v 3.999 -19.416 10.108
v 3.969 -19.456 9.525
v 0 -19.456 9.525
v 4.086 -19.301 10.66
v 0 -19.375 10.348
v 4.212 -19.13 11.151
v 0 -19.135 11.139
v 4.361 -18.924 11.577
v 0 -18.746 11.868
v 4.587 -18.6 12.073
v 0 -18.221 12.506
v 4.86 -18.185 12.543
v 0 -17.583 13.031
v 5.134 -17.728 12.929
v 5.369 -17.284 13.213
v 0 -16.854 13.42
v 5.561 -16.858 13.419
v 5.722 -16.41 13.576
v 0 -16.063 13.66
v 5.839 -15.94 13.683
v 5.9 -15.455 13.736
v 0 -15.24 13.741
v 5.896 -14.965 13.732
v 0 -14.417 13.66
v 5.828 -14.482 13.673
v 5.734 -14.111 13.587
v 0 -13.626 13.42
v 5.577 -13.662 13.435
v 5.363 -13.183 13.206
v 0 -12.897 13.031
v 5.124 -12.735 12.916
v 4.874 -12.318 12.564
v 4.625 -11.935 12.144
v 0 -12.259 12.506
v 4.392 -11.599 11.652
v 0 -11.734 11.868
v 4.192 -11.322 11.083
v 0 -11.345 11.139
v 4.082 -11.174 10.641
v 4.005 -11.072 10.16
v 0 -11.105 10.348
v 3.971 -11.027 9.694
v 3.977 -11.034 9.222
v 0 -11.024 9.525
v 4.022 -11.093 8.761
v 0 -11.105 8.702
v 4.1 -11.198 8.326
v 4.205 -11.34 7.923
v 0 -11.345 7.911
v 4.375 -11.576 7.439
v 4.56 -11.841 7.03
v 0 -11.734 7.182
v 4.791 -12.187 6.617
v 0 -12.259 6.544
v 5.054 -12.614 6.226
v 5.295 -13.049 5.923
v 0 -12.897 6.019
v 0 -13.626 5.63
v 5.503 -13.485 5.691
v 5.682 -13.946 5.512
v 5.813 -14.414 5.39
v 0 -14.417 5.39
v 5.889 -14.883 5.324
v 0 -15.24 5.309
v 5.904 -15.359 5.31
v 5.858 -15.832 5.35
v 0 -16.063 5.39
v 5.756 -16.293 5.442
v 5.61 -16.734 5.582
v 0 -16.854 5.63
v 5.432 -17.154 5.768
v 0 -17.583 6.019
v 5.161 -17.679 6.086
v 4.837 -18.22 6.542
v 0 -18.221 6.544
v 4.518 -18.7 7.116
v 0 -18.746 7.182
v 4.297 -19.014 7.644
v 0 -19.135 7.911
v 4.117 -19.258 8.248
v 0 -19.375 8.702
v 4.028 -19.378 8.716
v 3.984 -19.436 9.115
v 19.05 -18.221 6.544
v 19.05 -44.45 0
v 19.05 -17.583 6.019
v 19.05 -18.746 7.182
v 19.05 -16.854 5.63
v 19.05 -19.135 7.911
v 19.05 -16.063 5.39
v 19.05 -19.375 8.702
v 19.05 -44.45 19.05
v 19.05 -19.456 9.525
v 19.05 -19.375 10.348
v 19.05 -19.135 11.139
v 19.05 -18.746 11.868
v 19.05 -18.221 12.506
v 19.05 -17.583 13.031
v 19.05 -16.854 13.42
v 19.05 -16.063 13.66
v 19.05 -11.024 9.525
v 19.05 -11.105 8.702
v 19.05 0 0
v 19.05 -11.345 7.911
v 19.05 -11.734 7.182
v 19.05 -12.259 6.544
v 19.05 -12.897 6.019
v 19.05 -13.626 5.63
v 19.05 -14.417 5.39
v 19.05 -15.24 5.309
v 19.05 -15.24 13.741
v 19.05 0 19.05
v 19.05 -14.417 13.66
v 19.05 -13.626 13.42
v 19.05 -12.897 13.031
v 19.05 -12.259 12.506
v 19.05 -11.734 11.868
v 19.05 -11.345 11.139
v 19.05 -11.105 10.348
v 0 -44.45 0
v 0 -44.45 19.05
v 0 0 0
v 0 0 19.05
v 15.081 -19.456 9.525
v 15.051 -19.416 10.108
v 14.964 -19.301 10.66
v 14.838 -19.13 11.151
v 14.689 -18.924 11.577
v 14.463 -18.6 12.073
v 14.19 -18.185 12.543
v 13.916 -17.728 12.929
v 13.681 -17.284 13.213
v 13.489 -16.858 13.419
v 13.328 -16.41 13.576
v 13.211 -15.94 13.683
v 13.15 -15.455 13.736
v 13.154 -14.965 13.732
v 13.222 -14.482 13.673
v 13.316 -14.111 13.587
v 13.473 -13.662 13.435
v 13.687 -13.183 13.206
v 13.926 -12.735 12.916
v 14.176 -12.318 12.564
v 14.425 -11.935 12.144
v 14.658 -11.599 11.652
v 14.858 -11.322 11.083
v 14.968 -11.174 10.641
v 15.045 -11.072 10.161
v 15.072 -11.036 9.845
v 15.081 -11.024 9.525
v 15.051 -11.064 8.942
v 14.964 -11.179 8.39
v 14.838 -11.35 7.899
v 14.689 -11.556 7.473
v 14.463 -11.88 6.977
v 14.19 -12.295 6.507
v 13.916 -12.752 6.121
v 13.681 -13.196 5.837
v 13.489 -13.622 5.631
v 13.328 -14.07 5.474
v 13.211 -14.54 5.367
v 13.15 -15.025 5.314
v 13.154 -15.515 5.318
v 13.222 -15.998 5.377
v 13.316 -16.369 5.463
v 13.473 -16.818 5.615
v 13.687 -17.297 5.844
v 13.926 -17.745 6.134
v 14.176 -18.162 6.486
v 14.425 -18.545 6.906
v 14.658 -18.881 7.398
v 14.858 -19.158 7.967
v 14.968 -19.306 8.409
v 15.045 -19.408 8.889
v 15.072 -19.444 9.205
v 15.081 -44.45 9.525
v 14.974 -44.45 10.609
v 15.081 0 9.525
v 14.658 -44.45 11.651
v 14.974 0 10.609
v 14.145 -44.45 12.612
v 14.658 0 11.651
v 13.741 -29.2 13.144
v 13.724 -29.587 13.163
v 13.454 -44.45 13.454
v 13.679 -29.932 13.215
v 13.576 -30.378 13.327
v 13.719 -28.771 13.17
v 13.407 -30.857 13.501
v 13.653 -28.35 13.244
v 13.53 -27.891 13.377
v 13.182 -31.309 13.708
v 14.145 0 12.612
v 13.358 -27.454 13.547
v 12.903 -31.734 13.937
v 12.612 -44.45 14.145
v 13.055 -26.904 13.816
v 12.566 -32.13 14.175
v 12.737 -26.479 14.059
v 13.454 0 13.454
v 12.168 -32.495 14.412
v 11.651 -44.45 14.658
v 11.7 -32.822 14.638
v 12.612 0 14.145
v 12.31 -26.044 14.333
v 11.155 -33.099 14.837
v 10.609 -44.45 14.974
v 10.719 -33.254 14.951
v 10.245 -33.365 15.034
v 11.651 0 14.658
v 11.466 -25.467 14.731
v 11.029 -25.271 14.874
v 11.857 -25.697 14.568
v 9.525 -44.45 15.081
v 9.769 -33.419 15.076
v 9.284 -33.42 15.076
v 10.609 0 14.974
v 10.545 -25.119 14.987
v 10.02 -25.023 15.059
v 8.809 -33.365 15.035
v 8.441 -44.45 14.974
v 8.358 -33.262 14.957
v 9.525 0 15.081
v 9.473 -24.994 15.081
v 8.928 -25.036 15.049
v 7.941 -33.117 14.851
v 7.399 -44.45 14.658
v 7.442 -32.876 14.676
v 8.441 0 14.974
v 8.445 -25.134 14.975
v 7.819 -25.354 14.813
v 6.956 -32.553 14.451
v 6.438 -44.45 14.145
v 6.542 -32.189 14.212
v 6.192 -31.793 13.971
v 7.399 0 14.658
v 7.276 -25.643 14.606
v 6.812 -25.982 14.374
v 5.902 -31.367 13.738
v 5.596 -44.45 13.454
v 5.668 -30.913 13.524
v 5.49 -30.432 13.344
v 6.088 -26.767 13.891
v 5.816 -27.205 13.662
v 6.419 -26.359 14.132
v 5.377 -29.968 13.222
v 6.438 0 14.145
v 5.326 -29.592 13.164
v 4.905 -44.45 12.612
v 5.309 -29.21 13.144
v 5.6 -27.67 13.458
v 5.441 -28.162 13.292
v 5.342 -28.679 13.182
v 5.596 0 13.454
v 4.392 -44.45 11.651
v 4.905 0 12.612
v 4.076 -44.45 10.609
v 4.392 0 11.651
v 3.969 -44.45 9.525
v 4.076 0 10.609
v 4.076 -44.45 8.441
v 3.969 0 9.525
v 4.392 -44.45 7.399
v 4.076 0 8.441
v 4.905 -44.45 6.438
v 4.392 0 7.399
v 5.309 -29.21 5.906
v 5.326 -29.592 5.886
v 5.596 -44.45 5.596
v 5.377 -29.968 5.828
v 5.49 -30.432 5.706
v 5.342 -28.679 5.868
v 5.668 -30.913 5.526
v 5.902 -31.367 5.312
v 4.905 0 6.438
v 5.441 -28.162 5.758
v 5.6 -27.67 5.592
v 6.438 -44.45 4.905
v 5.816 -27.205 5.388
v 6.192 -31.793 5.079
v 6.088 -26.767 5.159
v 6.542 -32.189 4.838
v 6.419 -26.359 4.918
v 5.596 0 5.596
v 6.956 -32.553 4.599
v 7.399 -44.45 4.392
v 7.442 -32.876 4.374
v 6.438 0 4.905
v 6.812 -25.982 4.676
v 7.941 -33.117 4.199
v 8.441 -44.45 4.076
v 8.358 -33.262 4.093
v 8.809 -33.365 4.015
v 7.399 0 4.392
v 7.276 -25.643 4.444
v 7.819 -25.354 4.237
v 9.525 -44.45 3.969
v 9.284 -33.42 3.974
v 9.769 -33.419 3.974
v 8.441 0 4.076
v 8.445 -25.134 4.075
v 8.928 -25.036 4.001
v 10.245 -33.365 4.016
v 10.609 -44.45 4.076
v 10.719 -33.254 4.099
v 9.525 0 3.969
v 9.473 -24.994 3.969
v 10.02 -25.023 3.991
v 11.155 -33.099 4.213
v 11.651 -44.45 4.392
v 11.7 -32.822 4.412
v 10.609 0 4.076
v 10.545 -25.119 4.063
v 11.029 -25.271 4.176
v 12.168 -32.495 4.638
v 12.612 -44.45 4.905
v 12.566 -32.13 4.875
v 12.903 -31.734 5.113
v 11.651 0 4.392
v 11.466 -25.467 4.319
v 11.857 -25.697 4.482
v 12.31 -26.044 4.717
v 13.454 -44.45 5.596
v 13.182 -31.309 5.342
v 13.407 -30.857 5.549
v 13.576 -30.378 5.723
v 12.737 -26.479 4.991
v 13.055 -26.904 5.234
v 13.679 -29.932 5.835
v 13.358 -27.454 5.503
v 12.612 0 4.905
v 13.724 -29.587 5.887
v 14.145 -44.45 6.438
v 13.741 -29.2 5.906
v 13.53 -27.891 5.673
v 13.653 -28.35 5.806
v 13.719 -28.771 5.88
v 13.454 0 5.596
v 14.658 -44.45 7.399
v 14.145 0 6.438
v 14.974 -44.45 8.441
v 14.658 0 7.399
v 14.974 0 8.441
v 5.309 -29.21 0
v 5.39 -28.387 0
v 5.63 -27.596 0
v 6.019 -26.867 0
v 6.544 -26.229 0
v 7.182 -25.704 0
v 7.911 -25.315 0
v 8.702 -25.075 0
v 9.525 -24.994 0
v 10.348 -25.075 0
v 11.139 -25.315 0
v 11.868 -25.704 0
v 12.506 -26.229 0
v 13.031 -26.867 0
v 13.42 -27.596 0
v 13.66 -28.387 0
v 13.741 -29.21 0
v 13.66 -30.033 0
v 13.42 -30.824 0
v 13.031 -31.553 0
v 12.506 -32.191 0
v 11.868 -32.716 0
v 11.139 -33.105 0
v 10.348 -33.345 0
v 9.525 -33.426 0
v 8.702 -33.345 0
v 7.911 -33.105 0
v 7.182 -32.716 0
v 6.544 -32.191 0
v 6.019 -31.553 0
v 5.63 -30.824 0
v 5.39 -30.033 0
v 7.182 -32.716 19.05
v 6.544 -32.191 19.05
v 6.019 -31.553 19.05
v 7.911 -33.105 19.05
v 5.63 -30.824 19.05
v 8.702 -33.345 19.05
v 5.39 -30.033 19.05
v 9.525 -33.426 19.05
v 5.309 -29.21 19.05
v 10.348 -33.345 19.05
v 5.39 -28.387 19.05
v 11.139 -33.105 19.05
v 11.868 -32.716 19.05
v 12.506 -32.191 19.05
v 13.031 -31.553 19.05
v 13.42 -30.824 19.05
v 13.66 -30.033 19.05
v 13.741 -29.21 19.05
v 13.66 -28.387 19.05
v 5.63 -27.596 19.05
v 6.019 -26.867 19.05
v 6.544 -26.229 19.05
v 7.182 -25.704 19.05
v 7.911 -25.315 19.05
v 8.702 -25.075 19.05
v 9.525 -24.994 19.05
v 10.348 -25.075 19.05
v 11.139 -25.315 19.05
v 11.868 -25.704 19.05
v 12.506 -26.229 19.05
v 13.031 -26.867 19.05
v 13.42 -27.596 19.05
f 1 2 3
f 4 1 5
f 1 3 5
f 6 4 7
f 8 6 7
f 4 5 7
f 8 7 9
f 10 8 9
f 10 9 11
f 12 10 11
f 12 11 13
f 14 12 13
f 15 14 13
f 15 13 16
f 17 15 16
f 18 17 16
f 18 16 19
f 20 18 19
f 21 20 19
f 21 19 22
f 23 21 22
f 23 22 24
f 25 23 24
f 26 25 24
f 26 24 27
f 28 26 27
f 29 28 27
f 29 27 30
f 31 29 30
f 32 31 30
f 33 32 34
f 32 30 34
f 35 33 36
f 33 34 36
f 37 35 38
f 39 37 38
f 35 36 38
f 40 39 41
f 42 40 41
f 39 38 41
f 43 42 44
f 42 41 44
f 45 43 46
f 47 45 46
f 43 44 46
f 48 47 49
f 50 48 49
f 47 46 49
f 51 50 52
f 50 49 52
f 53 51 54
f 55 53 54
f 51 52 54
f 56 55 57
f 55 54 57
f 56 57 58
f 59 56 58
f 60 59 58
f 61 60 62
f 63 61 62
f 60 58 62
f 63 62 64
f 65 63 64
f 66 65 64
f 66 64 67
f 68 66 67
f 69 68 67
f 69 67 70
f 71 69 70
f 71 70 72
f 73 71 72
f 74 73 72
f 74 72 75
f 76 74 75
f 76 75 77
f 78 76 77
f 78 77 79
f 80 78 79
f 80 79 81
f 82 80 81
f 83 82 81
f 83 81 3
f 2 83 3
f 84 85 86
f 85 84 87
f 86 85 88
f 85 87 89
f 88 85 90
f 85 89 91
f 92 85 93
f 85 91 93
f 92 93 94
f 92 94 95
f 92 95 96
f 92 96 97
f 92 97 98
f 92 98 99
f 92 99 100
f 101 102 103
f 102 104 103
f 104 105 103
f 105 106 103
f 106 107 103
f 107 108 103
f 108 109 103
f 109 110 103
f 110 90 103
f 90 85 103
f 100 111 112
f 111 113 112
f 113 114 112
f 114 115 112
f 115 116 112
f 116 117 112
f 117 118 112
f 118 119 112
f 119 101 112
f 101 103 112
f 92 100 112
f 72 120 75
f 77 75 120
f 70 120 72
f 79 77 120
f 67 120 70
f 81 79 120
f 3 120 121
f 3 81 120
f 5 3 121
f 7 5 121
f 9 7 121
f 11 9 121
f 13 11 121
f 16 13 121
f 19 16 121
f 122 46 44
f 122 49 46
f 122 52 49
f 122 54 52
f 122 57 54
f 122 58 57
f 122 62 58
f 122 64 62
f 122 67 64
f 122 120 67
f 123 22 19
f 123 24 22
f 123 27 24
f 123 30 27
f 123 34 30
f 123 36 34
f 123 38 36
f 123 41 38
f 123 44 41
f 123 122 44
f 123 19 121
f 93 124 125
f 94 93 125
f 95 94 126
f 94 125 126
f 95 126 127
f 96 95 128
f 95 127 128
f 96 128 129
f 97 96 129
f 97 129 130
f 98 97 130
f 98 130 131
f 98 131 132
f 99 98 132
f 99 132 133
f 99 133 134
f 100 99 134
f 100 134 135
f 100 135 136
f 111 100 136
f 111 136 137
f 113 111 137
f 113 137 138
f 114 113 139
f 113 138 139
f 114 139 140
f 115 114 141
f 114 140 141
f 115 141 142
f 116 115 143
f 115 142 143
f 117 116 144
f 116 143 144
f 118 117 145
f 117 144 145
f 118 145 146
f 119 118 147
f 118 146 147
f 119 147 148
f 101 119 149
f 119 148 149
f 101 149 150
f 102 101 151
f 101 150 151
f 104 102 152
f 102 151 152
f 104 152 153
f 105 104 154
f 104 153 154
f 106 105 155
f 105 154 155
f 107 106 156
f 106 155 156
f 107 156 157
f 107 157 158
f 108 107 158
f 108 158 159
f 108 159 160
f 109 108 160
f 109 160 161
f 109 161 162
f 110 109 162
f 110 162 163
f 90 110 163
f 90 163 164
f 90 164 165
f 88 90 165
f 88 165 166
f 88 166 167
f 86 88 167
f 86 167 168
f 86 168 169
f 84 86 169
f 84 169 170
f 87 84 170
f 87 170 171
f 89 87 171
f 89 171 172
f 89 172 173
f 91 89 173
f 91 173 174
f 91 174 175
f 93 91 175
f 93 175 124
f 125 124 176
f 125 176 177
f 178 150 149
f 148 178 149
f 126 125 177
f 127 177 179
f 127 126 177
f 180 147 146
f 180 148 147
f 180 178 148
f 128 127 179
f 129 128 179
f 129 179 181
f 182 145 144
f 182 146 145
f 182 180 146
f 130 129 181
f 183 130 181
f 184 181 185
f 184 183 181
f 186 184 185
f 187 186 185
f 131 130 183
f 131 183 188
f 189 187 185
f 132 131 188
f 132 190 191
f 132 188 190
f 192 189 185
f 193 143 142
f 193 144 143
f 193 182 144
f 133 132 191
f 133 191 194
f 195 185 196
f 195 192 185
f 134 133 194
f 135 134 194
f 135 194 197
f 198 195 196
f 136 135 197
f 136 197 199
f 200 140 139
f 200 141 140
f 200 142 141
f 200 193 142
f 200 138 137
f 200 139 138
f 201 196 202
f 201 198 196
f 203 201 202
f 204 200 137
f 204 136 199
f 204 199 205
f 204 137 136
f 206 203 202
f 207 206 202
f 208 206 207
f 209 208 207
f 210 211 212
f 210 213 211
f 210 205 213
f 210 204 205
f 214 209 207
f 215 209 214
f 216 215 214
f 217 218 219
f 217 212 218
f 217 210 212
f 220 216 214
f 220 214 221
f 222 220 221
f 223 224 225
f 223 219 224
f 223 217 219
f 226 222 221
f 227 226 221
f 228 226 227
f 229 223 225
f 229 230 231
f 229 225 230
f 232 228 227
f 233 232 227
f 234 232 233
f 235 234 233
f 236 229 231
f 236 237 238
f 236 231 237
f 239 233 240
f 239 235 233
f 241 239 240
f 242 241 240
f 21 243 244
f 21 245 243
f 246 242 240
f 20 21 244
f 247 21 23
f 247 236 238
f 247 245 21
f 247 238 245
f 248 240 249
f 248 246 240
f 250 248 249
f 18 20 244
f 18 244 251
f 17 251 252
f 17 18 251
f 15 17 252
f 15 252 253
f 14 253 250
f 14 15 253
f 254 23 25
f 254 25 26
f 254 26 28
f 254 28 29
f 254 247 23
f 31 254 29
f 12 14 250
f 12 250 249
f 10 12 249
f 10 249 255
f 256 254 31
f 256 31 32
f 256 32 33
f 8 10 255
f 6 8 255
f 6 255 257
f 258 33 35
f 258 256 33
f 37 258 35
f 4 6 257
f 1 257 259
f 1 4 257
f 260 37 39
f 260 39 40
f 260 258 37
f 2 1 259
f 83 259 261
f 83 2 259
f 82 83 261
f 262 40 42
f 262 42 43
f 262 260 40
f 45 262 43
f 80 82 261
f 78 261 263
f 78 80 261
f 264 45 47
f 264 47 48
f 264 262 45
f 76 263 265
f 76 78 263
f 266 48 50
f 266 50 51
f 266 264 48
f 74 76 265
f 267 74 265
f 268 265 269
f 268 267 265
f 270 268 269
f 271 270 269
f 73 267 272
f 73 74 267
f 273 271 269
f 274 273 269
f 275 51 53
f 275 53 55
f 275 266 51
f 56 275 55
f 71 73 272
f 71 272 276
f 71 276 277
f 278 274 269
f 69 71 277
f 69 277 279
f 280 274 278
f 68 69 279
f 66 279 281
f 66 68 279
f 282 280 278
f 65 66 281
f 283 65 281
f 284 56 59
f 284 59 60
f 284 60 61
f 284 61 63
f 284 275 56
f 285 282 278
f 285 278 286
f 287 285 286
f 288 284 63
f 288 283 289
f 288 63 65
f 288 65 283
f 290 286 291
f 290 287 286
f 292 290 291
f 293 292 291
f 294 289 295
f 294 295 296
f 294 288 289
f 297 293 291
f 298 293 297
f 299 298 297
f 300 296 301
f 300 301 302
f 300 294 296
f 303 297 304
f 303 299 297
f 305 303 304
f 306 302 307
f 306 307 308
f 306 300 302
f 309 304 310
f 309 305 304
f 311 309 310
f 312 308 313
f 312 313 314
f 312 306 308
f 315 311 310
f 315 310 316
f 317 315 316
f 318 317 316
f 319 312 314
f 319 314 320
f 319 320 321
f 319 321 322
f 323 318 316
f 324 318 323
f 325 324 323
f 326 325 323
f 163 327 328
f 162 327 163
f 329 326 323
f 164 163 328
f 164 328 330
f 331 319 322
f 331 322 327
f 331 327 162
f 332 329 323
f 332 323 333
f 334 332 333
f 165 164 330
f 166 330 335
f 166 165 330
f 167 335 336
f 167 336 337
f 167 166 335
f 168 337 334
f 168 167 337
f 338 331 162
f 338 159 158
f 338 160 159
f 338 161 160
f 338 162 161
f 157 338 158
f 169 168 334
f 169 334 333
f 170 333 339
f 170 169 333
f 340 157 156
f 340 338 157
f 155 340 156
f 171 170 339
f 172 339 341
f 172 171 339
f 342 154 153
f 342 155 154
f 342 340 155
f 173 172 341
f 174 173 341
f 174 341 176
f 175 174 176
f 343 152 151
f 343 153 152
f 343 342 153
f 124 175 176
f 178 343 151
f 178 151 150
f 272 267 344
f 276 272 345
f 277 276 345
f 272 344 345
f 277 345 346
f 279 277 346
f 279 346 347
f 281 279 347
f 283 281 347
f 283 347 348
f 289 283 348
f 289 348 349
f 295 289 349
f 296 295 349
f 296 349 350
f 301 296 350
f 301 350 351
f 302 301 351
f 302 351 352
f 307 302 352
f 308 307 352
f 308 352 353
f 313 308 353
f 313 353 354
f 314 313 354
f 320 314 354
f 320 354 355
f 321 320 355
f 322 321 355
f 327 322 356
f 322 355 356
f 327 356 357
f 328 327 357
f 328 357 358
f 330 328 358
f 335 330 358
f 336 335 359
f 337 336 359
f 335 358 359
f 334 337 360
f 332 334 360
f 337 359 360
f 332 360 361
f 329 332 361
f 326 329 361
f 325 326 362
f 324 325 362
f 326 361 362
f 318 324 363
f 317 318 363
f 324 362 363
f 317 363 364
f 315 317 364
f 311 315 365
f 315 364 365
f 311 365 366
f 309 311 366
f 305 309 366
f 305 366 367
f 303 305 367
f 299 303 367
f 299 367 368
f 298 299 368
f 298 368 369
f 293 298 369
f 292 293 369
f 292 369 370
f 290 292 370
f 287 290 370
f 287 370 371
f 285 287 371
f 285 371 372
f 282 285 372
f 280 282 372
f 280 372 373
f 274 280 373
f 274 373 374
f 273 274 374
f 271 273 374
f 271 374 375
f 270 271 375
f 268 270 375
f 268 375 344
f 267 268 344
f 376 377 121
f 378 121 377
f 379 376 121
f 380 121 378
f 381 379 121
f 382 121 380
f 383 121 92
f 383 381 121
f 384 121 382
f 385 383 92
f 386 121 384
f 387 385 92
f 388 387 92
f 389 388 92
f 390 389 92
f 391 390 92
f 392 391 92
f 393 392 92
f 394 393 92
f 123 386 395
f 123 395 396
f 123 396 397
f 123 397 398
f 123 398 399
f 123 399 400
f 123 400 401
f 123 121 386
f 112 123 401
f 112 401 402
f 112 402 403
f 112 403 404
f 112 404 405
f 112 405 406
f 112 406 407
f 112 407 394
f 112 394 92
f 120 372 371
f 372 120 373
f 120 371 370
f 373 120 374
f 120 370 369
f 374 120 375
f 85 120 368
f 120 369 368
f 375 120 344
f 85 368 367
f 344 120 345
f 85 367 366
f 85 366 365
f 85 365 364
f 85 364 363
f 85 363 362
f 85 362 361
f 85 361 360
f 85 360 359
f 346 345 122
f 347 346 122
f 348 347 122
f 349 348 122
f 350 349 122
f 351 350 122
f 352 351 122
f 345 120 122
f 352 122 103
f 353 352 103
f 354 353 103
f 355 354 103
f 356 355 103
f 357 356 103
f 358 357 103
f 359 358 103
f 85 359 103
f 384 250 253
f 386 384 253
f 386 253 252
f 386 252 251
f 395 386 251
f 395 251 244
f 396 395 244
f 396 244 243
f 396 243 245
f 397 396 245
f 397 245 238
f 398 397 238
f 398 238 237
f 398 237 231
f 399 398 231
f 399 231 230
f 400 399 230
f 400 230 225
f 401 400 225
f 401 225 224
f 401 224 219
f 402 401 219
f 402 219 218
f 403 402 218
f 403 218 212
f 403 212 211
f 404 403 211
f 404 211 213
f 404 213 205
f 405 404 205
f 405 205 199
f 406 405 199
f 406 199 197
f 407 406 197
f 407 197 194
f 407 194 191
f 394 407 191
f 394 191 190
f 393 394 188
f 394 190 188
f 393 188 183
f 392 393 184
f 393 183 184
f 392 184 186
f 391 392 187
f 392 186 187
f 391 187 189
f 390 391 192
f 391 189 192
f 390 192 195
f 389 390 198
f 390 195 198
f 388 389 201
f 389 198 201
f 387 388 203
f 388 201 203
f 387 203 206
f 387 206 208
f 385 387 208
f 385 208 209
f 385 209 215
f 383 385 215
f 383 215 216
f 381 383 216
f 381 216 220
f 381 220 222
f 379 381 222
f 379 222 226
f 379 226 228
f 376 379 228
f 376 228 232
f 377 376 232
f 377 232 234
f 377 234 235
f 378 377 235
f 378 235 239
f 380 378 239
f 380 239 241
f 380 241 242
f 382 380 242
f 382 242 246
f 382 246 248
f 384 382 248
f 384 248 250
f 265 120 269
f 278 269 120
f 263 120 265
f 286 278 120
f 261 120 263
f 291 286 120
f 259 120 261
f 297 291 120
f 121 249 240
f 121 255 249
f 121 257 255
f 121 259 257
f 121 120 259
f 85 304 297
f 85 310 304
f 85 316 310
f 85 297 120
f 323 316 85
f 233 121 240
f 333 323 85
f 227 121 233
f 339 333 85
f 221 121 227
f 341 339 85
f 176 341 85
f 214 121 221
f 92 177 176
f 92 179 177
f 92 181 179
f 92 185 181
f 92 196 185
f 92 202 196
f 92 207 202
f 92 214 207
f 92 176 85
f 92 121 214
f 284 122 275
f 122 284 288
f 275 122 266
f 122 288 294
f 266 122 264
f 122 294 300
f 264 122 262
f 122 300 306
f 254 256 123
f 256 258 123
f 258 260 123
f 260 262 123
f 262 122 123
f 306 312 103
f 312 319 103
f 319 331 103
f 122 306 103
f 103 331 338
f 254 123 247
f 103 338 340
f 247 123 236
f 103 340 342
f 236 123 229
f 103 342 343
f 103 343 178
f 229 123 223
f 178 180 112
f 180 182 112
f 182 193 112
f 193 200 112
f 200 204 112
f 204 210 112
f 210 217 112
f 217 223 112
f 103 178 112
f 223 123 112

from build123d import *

# Parameters (mm, degrees)
F0_W     = 19.05
F0_H     = 19.05
F0_R     = 5.55625
F1_DEPTH = 44.45
F3_D     = 8.4328
F5_D     = 8.4328


# Not quite as in the source:
# - a feature names something its author has since deleted; it is built from what else it names


with BuildPart() as f1:
    # F0 (on Front) → F1 (new body)
    with BuildSketch(Plane.XZ):
        with Locations((9.525, 9.525)):
            Rectangle(F0_W, F0_H)
        with Locations((9.525, 9.525)):
            Circle(F0_R, mode=Mode.SUBTRACT)
    extrude(amount=F1_DEPTH)

    # F3 (through all)
    with Locations(Plane.XY.offset(19.05)):
        with Locations((9.525, -29.21)):
            Hole(F3_D / 2)

    # F5 (through all)
    with Locations(Plane.YZ.offset(19.05)):
        with Locations((-15.24, 9.525)):
            Hole(F5_D / 2)


solid = f1.part
